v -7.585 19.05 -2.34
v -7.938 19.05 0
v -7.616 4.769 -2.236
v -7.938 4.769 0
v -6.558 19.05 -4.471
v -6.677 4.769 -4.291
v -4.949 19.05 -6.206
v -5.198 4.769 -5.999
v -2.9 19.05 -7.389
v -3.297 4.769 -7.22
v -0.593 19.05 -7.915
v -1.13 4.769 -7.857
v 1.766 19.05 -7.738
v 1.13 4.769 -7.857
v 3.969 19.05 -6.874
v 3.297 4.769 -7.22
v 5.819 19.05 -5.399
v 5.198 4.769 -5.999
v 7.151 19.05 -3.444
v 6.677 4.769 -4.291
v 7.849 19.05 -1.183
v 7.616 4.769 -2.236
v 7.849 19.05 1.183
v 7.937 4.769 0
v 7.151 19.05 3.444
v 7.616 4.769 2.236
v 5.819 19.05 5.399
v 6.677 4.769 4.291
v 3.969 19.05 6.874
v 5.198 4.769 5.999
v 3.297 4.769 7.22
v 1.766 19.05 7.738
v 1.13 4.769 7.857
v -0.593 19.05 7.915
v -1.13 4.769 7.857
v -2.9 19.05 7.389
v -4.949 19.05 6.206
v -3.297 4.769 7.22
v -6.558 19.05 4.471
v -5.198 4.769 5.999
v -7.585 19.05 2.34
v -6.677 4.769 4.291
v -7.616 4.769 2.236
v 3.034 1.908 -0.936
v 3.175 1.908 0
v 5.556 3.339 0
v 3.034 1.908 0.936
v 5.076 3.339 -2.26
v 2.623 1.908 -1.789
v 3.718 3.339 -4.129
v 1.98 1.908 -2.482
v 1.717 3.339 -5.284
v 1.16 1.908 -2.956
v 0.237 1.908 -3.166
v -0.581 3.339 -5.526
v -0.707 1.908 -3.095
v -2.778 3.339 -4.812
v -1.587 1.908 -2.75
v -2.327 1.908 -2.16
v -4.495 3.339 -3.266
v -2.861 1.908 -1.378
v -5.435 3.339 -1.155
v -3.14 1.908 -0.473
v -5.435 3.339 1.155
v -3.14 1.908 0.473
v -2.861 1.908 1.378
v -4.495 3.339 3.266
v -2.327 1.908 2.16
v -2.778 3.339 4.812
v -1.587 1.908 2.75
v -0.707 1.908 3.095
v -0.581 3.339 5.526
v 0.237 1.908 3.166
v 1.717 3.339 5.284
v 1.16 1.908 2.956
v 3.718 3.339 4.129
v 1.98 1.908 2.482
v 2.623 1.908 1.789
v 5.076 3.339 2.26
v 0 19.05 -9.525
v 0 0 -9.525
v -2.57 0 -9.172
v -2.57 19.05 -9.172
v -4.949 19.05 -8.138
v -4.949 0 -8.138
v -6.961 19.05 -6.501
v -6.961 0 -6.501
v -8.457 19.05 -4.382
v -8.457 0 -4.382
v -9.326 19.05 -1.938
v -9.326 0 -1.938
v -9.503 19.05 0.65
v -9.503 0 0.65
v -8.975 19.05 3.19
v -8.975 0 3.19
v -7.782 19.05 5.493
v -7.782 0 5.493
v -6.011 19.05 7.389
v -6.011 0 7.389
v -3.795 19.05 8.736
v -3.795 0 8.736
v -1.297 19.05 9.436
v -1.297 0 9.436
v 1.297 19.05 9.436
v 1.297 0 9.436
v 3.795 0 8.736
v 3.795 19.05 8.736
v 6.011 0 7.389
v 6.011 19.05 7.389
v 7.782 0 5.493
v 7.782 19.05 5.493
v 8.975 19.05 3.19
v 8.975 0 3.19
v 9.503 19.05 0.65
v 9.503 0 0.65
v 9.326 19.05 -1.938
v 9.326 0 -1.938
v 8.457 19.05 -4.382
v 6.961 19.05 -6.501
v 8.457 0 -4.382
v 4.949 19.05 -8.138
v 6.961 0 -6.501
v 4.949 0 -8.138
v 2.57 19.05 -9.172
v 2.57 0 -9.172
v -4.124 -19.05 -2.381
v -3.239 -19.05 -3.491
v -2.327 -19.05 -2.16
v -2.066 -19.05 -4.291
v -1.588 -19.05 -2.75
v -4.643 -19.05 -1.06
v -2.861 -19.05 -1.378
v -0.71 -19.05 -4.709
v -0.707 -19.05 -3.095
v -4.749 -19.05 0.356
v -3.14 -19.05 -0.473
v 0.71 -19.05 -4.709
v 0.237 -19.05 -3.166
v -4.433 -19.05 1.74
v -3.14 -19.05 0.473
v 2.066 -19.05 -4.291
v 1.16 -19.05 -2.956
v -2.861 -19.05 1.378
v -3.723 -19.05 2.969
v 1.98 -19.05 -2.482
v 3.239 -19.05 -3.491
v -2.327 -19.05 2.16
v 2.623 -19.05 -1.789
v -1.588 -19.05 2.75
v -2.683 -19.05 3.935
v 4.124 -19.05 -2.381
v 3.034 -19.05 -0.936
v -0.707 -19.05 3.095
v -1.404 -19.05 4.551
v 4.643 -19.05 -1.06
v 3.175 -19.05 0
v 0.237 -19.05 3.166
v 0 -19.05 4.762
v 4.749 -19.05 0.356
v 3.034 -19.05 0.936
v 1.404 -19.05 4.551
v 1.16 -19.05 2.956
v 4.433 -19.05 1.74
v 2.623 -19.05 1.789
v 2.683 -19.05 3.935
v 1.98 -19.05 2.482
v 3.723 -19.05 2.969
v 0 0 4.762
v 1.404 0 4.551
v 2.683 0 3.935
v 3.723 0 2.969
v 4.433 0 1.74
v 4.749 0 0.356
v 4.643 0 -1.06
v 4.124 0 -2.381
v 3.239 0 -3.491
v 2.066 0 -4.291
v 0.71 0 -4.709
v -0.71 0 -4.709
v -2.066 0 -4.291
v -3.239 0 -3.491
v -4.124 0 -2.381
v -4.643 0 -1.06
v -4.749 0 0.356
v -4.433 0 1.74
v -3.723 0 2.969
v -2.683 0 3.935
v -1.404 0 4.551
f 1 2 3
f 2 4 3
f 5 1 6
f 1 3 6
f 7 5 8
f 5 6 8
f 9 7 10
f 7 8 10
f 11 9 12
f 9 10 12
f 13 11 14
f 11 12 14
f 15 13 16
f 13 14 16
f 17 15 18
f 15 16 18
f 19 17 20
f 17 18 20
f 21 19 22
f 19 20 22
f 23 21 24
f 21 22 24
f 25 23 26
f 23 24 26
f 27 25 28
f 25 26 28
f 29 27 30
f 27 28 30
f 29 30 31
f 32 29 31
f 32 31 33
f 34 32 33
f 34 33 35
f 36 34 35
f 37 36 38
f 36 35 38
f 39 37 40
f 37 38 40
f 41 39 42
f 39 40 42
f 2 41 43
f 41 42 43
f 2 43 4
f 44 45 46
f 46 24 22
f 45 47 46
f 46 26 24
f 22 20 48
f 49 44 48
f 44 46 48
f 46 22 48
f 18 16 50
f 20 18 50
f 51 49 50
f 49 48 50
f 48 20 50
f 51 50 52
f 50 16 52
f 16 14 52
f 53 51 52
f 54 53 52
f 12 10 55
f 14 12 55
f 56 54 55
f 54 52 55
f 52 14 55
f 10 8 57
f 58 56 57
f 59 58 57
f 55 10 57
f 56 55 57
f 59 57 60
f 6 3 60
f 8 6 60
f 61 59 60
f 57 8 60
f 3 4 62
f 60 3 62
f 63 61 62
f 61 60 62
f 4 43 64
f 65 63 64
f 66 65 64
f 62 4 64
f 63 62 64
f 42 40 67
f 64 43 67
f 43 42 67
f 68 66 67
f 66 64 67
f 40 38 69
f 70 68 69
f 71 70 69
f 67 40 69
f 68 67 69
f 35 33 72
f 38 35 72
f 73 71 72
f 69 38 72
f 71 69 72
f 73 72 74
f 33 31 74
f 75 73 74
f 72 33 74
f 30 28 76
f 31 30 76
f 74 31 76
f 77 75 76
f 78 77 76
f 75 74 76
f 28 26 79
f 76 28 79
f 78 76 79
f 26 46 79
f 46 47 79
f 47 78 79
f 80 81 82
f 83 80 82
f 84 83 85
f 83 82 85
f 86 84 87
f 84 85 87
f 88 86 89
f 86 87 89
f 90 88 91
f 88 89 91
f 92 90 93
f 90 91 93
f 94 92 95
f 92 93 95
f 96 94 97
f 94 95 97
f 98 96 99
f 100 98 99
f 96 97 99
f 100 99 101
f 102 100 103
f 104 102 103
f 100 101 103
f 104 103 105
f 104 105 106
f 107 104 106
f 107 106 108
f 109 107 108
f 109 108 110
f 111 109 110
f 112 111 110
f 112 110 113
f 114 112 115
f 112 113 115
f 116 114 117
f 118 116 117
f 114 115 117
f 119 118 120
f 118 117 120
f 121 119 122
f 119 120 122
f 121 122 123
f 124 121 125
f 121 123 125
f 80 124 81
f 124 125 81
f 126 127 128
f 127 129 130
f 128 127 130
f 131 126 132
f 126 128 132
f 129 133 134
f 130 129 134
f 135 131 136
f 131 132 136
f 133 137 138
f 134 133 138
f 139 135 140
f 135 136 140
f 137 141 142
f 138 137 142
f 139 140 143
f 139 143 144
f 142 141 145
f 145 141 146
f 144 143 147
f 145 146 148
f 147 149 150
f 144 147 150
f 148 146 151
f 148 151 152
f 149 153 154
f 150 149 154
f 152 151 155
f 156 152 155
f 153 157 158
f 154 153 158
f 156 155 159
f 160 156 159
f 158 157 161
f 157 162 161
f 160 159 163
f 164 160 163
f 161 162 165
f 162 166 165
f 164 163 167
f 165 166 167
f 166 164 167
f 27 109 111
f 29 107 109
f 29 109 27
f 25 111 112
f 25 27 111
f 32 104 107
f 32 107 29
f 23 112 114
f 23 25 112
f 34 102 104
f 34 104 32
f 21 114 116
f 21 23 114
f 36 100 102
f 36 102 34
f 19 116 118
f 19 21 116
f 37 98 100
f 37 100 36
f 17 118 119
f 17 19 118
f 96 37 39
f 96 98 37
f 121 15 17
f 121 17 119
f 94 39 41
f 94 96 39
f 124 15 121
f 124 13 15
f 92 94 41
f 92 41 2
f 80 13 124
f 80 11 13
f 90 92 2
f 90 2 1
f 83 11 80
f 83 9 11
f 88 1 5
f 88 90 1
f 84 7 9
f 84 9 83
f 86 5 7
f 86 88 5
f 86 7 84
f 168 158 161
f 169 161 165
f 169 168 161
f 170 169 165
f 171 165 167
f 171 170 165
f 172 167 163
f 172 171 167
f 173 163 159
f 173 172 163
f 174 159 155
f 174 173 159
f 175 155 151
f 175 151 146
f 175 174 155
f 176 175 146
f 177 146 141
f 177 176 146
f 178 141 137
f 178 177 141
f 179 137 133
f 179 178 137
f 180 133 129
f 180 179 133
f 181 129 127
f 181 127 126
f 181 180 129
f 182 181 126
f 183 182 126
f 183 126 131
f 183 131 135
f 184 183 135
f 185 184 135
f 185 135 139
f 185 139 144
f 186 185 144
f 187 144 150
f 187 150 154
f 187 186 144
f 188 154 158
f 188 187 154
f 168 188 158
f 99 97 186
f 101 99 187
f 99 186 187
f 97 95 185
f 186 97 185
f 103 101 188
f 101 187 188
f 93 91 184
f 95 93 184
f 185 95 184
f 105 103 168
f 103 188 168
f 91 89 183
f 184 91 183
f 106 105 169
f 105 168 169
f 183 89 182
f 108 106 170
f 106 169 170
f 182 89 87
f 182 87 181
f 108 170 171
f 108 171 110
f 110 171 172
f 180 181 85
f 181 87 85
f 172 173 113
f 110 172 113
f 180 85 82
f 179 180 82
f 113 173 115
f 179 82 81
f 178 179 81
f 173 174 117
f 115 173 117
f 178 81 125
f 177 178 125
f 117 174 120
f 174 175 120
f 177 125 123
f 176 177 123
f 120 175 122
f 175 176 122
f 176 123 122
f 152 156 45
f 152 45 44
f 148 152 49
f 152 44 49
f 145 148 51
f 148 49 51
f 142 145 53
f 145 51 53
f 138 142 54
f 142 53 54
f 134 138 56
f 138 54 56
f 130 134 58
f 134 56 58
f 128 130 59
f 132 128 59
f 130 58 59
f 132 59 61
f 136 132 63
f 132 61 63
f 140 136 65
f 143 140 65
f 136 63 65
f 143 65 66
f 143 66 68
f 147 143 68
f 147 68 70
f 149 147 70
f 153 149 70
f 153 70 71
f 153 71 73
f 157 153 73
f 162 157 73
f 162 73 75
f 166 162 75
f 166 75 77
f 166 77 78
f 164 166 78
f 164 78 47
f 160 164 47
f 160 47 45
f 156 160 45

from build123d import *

# Parameters (mm, degrees)
SKETCH2_R                        = 9.525
SKETCH2_R_2                      = 4.7625
BOSS_EXTRUDE1_DEPTH              = 19.05
SKETCH2_3_R                      = 4.7625
BOSS_EXTRUDE2_DEPTH              = 19.05
F_5_8_0_625_DIAMETER_HOLE1_D     = 15.875
F_5_8_0_625_DIAMETER_HOLE1_DEPTH = 14.280668836
F_5_8_0_625_DIAMETER_HOLE1_TIP   = 4.769331164
F_1_4_0_25_DIAMETER_HOLE1_D      = 6.35


with BuildPart() as part:
    # Sketch2 → Boss-Extrude1 (new body)
    # profile 1 of 2: a face of its own
    with BuildSketch(Plane(origin=(0, 0, 0), x_dir=(1, 0, 0), z_dir=(0, 1, 0))):
        with Locations(Location((0, 0, 0), (0, 0, 90))):
            Circle(SKETCH2_R)
        Circle(SKETCH2_R_2, mode=Mode.SUBTRACT)
    # profile 2 of 2: a face of its own
    with BuildSketch(Plane(origin=(0, 0, 0), x_dir=(1, 0, 0), z_dir=(0, 1, 0))):
        Circle(SKETCH2_R_2)
    extrude(amount=BOSS_EXTRUDE1_DEPTH)

    # Sketch2<3> → Boss-Extrude2 (add)
    with BuildSketch(Plane(origin=(0, 0, 0), x_dir=(1, 0, 0), z_dir=(0, 1, 0))):
        with Locations(Location((0, 0, 0), (0, 0, 270))):
            Circle(SKETCH2_3_R)
    extrude(amount=-BOSS_EXTRUDE2_DEPTH)

    # 5/8 (0.625) Diameter Hole1
    with Locations(Plane(origin=(0, 19.05, 0), x_dir=(1, 0, 0), z_dir=(0, 1, 0))):
        with Locations((0, 0)):
            Hole(F_5_8_0_625_DIAMETER_HOLE1_D / 2, depth=F_5_8_0_625_DIAMETER_HOLE1_DEPTH)
            with Locations((0, 0, -(F_5_8_0_625_DIAMETER_HOLE1_DEPTH + F_5_8_0_625_DIAMETER_HOLE1_TIP / 2))):  # 118° drill point
                Cone(0, F_5_8_0_625_DIAMETER_HOLE1_D / 2, F_5_8_0_625_DIAMETER_HOLE1_TIP, mode=Mode.SUBTRACT)

    # 1/4 (0.25) Diameter Hole1 (through all)
    with Locations(Plane(origin=(0, -19.05, 0), x_dir=(-1, 0, 0), z_dir=(0, -1, 0))):
        with Locations((0, 0)):
            Hole(F_1_4_0_25_DIAMETER_HOLE1_D / 2)


solid = part.part
